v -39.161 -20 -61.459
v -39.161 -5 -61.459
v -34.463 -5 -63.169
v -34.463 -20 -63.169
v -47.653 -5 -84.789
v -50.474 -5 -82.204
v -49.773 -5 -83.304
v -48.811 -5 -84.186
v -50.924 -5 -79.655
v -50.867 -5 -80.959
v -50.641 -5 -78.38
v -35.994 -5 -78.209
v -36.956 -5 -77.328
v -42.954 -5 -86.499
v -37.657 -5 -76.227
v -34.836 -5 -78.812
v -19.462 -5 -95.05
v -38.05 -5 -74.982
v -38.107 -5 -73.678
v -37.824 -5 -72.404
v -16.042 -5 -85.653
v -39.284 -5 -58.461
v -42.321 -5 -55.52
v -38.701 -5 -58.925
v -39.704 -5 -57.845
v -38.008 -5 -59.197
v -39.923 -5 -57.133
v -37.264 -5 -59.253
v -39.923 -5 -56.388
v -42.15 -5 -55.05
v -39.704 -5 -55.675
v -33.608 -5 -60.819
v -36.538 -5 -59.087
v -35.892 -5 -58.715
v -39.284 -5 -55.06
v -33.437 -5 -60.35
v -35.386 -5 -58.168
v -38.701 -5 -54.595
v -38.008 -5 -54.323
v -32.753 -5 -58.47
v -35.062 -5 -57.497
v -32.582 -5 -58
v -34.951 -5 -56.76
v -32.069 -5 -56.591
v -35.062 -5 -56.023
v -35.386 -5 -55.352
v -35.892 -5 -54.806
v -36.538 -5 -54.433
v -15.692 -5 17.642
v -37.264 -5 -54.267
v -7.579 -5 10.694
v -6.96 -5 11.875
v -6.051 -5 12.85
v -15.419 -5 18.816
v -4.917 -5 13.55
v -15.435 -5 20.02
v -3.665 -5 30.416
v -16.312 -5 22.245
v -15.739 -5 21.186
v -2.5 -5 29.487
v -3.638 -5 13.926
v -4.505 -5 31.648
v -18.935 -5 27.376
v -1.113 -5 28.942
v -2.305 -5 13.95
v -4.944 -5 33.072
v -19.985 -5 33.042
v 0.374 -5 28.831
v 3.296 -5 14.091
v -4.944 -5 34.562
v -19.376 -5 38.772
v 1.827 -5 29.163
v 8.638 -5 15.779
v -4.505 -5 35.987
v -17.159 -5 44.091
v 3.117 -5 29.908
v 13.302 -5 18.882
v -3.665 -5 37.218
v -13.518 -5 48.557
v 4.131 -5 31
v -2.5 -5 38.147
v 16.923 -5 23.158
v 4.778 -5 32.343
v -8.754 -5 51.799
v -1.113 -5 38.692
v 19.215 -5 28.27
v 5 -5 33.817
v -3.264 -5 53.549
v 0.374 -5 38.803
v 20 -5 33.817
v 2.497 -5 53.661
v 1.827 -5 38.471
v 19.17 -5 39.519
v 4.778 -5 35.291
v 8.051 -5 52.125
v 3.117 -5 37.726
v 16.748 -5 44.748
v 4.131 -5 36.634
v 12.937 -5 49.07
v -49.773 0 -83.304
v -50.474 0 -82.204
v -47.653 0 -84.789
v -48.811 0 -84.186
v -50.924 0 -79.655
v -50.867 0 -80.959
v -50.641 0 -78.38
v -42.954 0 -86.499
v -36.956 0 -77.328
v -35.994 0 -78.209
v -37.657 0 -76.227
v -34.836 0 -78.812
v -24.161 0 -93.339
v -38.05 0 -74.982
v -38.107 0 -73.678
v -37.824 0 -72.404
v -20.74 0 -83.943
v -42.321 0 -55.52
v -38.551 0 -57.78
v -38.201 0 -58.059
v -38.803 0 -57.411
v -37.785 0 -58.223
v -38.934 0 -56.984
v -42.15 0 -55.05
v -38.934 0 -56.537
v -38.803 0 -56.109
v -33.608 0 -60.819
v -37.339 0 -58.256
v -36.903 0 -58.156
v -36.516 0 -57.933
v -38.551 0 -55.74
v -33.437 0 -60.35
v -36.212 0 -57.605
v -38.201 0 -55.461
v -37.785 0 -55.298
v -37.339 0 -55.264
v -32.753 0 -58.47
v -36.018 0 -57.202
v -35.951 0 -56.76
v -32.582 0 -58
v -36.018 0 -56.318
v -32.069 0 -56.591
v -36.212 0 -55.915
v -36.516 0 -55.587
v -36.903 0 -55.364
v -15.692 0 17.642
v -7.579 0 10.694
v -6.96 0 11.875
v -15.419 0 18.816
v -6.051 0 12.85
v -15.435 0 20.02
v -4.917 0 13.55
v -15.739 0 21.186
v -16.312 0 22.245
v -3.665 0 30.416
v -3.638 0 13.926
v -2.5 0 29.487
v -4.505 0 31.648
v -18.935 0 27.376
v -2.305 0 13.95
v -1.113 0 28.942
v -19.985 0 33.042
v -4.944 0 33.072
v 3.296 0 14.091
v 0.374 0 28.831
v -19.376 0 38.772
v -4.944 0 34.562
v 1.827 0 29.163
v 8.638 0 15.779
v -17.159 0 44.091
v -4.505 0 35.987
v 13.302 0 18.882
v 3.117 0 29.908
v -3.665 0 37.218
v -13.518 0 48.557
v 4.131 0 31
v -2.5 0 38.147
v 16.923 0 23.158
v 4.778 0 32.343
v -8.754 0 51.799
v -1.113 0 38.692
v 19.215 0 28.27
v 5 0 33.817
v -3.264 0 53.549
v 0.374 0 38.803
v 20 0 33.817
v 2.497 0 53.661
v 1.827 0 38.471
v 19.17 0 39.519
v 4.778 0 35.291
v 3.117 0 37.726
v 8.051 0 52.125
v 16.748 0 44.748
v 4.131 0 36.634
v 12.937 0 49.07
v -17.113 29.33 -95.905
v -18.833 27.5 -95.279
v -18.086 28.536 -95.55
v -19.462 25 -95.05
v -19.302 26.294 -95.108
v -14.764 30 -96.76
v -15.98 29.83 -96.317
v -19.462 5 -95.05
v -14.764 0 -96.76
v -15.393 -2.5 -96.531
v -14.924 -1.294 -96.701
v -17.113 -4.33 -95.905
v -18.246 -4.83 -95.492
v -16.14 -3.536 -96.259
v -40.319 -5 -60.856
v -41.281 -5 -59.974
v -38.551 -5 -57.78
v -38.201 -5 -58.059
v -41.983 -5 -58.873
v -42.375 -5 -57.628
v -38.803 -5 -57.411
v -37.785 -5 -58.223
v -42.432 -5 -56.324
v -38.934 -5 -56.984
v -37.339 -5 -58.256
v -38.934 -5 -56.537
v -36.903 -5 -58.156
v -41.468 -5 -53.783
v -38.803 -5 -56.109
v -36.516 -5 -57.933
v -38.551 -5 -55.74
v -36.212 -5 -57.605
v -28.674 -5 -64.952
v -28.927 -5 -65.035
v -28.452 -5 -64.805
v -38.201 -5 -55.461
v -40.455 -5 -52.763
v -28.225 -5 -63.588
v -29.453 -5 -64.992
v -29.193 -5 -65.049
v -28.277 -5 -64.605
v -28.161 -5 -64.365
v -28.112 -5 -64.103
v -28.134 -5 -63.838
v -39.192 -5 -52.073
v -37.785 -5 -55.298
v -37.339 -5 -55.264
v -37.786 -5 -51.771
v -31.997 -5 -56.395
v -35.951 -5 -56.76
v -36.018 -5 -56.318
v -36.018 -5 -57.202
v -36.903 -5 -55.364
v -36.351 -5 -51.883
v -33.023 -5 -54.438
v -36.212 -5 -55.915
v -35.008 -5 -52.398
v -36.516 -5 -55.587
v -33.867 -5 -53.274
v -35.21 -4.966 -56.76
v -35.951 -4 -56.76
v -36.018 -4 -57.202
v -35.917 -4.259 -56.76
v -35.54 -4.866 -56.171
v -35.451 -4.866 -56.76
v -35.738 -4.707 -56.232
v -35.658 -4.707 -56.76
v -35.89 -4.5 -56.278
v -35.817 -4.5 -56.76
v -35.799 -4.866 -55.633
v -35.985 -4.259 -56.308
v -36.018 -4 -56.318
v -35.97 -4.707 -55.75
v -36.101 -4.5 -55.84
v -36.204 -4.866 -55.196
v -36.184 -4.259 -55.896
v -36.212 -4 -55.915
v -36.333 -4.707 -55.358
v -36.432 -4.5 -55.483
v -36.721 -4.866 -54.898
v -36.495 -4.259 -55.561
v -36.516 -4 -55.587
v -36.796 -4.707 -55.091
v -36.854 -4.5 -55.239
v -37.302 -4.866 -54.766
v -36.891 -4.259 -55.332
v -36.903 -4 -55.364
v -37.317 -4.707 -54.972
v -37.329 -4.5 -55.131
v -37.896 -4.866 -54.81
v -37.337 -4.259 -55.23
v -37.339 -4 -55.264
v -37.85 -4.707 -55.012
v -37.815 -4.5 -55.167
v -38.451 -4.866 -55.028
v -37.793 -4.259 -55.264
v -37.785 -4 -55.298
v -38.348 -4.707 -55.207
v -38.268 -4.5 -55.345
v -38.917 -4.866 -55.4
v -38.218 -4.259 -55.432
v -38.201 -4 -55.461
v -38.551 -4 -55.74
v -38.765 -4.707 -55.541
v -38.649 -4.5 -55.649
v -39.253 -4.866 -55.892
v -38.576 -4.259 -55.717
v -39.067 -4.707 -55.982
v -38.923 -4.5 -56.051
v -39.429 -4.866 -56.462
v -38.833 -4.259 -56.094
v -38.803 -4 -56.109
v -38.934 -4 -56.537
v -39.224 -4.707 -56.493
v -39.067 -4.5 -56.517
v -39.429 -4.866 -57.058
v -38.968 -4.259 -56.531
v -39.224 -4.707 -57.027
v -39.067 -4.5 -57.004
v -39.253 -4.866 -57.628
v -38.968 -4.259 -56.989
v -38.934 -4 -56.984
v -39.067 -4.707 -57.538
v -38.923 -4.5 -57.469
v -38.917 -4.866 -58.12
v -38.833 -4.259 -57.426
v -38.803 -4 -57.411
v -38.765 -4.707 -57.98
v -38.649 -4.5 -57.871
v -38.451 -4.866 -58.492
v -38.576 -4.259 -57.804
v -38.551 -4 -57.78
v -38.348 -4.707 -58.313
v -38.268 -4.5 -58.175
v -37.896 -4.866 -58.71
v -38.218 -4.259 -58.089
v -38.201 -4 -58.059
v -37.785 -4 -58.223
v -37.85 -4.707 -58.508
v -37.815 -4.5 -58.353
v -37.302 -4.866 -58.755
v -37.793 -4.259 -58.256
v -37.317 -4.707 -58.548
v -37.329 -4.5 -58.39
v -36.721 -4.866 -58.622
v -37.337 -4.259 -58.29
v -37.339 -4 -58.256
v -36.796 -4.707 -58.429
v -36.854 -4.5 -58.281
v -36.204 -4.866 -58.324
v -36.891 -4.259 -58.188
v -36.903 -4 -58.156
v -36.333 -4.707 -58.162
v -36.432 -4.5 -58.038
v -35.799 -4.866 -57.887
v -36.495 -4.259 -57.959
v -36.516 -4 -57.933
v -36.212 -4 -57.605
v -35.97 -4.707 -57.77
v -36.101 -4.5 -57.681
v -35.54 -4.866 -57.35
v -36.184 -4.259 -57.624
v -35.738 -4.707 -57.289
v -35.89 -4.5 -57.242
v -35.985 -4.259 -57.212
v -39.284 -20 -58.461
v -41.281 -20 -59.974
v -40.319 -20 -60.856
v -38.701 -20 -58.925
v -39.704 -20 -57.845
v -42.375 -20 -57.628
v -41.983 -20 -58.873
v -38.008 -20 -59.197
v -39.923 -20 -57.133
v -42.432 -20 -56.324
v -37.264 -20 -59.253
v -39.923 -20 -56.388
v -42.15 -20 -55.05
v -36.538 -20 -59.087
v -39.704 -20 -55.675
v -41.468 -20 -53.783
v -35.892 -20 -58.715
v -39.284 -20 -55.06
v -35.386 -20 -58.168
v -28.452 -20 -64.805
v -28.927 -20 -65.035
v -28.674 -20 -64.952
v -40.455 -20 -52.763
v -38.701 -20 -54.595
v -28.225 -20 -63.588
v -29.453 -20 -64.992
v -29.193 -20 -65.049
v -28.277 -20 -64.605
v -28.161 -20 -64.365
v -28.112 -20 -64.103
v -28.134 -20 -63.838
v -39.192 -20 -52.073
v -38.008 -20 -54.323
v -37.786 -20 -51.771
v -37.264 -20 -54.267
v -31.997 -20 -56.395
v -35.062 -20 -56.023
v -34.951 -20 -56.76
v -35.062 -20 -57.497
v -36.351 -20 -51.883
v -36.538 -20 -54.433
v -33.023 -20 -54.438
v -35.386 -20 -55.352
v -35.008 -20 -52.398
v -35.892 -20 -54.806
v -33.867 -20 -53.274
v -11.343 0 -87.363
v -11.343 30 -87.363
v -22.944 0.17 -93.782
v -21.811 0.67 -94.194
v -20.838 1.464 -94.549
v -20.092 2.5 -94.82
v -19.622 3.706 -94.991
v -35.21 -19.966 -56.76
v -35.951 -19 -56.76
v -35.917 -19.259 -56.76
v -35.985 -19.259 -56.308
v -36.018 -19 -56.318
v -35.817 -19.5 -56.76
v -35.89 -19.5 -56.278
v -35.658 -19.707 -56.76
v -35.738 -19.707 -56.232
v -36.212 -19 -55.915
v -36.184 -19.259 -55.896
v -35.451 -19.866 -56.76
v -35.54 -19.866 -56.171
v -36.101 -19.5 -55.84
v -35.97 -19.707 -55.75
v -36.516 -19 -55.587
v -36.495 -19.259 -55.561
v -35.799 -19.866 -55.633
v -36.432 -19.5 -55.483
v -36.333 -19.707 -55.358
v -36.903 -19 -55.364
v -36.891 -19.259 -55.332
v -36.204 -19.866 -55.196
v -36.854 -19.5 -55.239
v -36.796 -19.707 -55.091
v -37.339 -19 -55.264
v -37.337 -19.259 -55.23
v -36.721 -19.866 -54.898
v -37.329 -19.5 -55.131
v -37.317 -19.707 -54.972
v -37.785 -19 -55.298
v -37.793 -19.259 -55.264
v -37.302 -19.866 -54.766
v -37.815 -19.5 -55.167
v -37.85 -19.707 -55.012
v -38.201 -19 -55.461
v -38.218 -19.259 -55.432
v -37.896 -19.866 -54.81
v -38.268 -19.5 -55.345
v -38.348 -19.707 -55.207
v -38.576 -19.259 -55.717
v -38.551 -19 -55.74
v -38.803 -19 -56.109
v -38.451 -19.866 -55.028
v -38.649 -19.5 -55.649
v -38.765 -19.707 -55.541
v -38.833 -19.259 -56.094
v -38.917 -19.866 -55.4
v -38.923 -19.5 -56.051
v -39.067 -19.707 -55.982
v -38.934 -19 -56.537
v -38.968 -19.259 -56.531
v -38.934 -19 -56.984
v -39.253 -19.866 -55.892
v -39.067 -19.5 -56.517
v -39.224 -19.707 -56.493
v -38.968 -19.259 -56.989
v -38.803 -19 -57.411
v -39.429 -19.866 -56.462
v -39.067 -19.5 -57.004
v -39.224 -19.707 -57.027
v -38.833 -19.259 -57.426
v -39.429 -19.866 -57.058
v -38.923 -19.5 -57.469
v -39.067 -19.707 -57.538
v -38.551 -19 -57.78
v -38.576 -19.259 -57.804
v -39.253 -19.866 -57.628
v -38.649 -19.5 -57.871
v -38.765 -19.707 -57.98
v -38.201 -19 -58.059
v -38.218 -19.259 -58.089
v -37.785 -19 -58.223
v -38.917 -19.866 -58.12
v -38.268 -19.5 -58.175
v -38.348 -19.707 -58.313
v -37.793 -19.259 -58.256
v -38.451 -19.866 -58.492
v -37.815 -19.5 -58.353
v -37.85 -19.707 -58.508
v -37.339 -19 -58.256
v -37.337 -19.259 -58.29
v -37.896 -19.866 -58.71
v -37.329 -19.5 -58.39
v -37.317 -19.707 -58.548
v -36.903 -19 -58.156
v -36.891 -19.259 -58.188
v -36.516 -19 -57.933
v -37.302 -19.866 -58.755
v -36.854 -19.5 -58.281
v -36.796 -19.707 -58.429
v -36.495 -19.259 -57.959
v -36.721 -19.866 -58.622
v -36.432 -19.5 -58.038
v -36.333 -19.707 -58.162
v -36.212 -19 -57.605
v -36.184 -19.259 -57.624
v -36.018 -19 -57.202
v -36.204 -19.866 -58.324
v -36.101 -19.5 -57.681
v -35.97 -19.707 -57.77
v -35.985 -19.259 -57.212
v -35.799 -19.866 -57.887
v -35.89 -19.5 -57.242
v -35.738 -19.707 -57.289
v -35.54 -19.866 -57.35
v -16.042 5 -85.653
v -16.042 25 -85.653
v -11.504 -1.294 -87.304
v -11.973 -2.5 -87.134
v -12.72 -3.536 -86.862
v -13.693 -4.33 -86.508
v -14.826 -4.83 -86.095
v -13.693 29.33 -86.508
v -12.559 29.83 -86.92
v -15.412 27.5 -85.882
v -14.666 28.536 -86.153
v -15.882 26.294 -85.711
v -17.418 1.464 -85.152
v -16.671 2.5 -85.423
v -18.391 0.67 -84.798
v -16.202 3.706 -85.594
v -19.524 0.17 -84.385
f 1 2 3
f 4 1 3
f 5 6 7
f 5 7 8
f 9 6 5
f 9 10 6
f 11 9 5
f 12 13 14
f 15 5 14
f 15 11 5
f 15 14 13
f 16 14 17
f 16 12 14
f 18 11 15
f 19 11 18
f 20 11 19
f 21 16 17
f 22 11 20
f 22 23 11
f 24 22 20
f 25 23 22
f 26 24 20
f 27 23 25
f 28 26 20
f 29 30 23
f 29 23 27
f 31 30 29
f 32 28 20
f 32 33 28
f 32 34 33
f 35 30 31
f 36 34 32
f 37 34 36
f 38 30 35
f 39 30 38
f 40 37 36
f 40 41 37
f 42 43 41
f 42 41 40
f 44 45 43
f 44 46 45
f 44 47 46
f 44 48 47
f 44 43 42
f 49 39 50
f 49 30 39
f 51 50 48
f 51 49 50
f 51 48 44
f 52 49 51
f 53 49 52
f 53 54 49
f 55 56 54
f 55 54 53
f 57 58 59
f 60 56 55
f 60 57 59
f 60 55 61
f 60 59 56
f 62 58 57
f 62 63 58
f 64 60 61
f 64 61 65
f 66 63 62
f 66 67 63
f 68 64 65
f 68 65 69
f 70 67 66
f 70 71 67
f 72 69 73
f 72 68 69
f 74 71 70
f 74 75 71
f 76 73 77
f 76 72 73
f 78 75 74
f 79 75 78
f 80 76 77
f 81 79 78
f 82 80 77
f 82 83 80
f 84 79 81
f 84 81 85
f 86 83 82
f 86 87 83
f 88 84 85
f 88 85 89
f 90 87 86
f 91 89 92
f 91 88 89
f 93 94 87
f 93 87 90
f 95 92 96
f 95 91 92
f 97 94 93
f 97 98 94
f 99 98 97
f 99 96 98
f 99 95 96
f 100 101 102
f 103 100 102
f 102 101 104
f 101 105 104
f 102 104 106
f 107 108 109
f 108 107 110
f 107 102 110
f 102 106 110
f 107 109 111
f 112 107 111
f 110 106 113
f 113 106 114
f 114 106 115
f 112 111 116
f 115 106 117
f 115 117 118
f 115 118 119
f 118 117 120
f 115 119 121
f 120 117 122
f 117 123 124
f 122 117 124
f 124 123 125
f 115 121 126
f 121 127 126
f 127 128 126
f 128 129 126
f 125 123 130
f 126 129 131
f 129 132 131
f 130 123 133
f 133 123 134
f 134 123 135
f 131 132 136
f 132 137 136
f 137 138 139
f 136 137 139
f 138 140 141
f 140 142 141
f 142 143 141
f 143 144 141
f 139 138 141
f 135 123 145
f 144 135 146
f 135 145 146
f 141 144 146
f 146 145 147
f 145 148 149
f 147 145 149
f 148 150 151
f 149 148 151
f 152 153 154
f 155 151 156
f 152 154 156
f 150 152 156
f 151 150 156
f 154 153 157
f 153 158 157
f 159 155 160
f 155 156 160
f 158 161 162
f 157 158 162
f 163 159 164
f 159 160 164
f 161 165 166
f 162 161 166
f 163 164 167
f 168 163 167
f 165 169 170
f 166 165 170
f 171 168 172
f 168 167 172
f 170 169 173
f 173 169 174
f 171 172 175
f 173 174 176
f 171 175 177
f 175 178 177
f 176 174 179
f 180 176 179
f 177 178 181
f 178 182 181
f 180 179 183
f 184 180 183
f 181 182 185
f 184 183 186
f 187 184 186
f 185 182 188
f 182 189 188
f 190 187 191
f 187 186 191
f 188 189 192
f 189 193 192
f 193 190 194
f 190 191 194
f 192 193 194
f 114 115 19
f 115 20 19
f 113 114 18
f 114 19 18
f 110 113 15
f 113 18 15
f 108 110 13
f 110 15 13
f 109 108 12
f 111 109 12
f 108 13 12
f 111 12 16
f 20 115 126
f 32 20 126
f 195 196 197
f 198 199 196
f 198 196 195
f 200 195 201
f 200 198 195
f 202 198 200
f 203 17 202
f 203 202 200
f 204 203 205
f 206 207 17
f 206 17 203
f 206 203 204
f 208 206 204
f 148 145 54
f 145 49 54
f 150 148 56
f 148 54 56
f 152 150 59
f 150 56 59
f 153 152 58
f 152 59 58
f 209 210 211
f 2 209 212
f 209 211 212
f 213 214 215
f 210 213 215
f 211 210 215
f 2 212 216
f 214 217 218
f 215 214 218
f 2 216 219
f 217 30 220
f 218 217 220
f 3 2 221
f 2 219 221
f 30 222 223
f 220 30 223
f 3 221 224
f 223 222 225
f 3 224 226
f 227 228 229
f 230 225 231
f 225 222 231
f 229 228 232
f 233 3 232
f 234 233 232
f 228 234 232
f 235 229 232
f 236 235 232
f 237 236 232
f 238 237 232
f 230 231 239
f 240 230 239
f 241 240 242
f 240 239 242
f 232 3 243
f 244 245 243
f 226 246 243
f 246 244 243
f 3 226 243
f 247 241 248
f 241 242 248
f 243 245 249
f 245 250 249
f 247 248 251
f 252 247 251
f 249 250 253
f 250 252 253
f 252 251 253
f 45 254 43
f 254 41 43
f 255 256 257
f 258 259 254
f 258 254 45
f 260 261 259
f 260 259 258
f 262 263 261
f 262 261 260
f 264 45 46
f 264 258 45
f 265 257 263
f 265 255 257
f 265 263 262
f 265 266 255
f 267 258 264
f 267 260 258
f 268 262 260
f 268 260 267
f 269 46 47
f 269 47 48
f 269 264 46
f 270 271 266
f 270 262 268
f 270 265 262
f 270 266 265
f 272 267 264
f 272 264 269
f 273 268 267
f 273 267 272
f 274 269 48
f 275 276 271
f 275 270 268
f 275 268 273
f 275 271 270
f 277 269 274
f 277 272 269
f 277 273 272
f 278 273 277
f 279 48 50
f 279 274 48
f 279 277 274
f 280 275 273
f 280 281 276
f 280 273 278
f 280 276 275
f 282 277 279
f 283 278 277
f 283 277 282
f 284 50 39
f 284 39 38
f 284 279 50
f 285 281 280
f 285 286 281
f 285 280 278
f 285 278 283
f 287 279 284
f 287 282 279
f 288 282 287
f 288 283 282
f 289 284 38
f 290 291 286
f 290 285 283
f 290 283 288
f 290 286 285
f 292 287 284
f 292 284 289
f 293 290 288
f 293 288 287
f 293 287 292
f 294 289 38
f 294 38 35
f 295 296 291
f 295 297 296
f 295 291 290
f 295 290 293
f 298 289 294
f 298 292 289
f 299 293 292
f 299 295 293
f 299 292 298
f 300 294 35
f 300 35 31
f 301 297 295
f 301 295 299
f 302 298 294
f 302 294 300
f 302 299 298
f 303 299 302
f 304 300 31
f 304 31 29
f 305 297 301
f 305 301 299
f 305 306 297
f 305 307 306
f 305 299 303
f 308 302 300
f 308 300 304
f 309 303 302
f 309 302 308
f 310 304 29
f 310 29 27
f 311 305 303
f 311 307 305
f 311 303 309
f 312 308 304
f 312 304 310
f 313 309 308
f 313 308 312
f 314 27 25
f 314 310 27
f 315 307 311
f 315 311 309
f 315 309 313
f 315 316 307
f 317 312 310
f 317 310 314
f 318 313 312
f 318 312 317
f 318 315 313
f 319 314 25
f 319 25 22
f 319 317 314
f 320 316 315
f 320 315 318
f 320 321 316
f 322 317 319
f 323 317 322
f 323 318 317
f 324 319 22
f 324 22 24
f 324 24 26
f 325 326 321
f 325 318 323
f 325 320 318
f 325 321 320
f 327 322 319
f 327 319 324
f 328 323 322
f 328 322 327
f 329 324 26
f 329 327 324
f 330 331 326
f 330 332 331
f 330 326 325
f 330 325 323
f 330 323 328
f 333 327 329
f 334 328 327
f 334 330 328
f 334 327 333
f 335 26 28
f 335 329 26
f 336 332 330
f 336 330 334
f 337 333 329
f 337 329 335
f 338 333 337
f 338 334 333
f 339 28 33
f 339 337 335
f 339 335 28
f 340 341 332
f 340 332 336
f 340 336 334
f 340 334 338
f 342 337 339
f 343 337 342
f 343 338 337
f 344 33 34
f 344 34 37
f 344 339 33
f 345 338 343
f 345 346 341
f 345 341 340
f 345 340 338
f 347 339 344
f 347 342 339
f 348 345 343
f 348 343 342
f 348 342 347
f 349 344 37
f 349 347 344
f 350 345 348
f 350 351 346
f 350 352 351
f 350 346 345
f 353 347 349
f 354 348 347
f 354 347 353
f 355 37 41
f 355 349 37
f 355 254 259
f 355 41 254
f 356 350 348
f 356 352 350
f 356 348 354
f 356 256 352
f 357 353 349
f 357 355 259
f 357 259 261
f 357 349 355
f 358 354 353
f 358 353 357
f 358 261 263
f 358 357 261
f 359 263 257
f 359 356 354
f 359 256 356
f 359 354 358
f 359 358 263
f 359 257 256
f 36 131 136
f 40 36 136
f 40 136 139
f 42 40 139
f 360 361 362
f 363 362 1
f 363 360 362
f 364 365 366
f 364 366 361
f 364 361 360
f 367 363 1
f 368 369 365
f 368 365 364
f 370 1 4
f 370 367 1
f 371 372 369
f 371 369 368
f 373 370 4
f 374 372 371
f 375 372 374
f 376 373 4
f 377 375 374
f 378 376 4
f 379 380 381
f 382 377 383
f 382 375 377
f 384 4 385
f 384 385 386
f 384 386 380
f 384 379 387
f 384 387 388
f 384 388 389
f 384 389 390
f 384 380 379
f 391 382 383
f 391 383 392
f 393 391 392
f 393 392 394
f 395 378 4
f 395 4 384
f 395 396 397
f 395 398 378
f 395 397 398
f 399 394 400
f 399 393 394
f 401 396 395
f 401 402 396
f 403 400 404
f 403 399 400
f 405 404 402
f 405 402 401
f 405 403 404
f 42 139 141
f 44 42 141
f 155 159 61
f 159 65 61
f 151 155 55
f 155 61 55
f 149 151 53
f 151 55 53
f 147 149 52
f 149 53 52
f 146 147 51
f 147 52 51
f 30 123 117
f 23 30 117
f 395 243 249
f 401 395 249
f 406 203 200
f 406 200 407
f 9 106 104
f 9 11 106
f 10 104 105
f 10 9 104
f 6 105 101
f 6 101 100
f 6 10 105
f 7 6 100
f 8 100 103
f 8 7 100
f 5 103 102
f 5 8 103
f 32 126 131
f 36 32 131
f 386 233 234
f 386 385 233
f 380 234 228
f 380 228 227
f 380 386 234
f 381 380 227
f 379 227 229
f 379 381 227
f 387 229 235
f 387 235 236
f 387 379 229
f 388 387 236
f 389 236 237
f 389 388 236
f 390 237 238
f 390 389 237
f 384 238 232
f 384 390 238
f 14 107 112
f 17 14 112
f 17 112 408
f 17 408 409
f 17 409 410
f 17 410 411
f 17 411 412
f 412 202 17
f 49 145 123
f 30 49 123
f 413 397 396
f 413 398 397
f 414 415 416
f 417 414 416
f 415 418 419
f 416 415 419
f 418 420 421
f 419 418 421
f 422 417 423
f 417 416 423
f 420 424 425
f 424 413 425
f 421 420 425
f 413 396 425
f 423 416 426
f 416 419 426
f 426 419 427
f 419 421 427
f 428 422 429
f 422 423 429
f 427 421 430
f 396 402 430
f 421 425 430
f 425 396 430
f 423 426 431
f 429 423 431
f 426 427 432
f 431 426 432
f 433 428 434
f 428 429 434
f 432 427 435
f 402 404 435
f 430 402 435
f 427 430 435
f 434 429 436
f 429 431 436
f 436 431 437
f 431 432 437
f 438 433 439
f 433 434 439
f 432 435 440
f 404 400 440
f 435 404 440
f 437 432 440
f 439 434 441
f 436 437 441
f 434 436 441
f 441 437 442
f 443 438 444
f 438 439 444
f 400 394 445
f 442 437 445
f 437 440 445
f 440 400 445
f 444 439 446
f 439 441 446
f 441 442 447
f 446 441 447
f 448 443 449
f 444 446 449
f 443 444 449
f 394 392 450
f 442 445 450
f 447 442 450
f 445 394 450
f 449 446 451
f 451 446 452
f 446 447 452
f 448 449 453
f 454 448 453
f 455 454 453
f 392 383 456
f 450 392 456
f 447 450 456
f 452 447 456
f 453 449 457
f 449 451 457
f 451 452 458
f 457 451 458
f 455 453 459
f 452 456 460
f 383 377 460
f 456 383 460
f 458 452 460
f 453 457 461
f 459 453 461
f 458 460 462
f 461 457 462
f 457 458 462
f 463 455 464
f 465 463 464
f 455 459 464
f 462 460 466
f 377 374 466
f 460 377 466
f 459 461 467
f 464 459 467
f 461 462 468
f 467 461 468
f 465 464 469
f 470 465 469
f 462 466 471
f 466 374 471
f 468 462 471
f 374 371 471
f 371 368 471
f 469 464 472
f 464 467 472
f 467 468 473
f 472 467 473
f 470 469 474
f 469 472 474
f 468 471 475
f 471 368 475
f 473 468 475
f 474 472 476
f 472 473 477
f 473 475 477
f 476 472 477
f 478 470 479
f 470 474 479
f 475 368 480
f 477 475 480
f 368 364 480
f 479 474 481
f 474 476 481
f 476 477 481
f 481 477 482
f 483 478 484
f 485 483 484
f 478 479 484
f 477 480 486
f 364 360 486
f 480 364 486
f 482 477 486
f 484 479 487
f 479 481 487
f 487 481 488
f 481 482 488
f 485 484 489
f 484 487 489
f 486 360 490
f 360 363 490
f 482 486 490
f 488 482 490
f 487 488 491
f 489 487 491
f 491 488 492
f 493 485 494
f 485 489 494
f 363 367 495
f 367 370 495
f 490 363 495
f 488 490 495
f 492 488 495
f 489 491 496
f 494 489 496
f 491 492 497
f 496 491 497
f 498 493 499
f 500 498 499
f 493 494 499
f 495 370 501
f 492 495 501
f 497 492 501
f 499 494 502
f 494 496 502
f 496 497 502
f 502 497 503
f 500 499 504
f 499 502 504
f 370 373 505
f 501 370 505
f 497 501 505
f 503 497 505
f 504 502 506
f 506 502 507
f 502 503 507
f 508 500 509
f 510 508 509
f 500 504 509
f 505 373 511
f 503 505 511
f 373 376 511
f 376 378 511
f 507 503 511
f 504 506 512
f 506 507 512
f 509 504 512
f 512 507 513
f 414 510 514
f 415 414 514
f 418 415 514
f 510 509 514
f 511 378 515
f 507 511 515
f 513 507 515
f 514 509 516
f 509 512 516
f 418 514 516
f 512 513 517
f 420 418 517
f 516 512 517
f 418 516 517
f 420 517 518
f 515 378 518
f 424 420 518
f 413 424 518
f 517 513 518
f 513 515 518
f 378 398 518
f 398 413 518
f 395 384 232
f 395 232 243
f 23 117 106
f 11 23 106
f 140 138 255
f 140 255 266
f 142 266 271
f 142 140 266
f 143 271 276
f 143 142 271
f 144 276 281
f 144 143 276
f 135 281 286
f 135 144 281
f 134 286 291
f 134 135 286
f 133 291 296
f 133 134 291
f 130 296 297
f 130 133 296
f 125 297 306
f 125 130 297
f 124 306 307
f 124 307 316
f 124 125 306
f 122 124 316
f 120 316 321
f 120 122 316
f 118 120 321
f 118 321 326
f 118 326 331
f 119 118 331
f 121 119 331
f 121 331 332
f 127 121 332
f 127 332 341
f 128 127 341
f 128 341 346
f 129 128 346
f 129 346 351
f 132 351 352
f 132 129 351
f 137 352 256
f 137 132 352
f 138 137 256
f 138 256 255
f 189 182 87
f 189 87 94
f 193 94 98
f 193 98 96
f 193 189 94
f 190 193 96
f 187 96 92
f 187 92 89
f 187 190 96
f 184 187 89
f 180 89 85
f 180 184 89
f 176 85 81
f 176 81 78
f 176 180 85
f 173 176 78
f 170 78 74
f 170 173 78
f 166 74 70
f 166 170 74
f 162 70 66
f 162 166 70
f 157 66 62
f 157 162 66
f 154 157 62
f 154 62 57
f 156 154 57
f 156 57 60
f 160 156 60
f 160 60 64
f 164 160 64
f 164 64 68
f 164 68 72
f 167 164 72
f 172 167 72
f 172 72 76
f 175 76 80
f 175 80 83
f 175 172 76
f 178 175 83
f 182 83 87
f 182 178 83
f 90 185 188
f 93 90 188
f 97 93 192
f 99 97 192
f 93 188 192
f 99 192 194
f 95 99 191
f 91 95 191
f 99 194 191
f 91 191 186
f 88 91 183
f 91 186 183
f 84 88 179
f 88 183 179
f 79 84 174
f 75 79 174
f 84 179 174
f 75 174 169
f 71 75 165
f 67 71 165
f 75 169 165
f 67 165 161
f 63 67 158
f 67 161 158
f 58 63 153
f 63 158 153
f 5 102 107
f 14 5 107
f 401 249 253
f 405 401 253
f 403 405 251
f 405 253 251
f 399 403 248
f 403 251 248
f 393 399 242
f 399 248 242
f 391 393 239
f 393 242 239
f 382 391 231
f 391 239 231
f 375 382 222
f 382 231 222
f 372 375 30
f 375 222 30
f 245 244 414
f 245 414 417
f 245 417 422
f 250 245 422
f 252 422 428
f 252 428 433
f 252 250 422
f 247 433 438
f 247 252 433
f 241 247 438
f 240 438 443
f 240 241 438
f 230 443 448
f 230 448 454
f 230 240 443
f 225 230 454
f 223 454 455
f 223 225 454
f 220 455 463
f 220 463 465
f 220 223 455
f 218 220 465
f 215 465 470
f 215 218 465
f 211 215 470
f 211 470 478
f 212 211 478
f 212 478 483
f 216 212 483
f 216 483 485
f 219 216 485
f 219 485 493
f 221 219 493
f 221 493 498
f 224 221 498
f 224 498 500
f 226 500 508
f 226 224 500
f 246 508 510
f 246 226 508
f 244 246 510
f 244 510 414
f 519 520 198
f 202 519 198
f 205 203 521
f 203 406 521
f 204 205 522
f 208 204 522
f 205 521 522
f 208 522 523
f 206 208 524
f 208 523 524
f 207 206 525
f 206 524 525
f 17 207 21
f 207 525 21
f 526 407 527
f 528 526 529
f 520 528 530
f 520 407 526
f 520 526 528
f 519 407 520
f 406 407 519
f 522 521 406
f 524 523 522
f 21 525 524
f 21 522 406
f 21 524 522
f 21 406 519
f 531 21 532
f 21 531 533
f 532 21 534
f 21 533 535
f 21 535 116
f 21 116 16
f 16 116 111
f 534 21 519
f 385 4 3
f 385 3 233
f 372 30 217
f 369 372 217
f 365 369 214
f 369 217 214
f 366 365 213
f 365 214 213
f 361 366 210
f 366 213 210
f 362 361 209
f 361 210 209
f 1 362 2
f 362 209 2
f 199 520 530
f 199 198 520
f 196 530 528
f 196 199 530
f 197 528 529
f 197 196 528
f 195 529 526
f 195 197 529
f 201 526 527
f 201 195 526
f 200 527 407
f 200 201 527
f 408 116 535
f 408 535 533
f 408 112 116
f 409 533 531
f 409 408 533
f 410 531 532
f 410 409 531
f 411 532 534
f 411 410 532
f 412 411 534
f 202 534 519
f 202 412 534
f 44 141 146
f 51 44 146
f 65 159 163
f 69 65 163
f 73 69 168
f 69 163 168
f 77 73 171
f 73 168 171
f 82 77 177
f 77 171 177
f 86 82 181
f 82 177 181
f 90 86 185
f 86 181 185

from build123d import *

# Parameters (mm, degrees)
F0_R     = 5
F0_R_2   = 1.5
F1_DEPTH = 5
F2_DEPTH = 30
F4_R     = 4.99999
F5_R     = 5
F3_R     = 1.5
F6_DEPTH = 15
F7_R     = 1
F7_2_R   = 1


# Not quite as in the source:
# - a fillet or chamfer is up to 0.001 mm smaller than in the source, because OpenCascade refuses the exact size
# - a feature names something its author has since deleted; it is built from what else it names


with BuildPart() as f1:
    # F0 (on Front) → F1 (new body)
    with BuildSketch(Plane.XZ):
        with BuildLine():
            ThreePointArc((20, 33.8170940264), (-7.2600924867, 52.4528407806), (-14.7291057085, 20.287369527))
            ThreePointArc((-14.7291057085, 20.287369527), (-10.7719287617, 16.9658166044), (-6.0959419995, 14.7687478741))
            ThreePointArc((-6.0959419995, 14.7687478741), (11.7915469725, 17.6628555734), (20, 33.8170940264))
        make_face()
        with Locations((0, 33.8170940264)):
            Circle(F0_R, mode=Mode.SUBTRACT)
        with BuildLine():
            Line((-14.7291057085, 20.287369527), (-42.1496687283, -55.0500081989))
            ThreePointArc((-42.1496687283, -55.0500081989), (-36.7371185286, -51.8113638601), (-32.4609528428, -56.4480570615))
            Line((-32.4609528428, -56.4480570615), (-32.0687023036, -56.5908245822))
            Line((-32.0687023036, -56.5908245822), (-6.0959419995, 14.7687478741))
            ThreePointArc((-6.0959419995, 14.7687478741), (-10.7719287617, 16.9658166044), (-14.7291057085, 20.287369527))
        make_face()
        with BuildLine():
            ThreePointArc((-32.4512056942, -56.7601091071), (-32.5271669199, -57.628349943), (-32.7527425538, -58.4702097236))
            Line((-32.7527425538, -58.4702097236), (-32.5817325186, -58.0003635134))
            Line((-32.5817325186, -58.0003635134), (-32.0687023036, -56.5908245822))
            Line((-32.0687023036, -56.5908245822), (-32.4609528428, -56.4480570615))
            ThreePointArc((-32.4609528428, -56.4480570615), (-32.4536430754, -56.6040069883), (-32.4512056942, -56.7601091071))
        make_face()
        with BuildLine():
            ThreePointArc((-33.8290334161, -60.2068275447), (-33.2012405407, -59.3940787717), (-32.7527425538, -58.4702097236))
            ThreePointArc((-32.7527425538, -58.4702097236), (-32.5271669199, -57.628349943), (-32.4512056942, -56.7601091071))
            ThreePointArc((-32.4512056942, -56.7601091071), (-32.4536430754, -56.6040069883), (-32.4609528428, -56.4480570615))
            ThreePointArc((-32.4609528428, -56.4480570615), (-36.7371185286, -51.8113638601), (-42.1496687283, -55.0500081989))
            ThreePointArc((-42.1496687283, -55.0500081989), (-40.0851754907, -61.0100741788), (-33.8290334161, -60.2068275447))
        make_face()
        with Locations((-37.4512056942, -56.7601091071)):
            Circle(F0_R_2, mode=Mode.SUBTRACT)
        with BuildLine():
            Line((-39.5341938332, -77.1020939848), (-33.6077929485, -60.8194413757))
            Line((-33.6077929485, -60.8194413757), (-33.4367828769, -60.3495950653))
            Line((-33.4367828769, -60.3495950653), (-33.8290334161, -60.2068275447))
            ThreePointArc((-33.8290334161, -60.2068275447), (-40.0851754907, -61.0100741788), (-42.1496687283, -55.0500081989))
            Line((-42.1496687283, -55.0500081989), (-42.3206788698, -55.5198547009))
            Line((-42.3206788698, -55.5198547009), (-52.3513214743, -83.0788187594))
            Line((-52.3513214743, -83.0788187594), (-42.9543952664, -86.4990201927))
            Line((-42.9543952664, -86.4990201927), (-39.5341938332, -77.1020939848))
        make_face()
        with BuildLine():
            Line((-33.8290334161, -60.2068275447), (-33.4367828769, -60.3495950653))
            Line((-33.4367828769, -60.3495950653), (-32.7527425538, -58.4702097236))
            ThreePointArc((-32.7527425538, -58.4702097236), (-33.2012405407, -59.3940787717), (-33.8290334161, -60.2068275447))
        make_face()
        Polygon((-16.0418783135, -85.652597568), (-39.5341938332, -77.1020939848), (-42.9543952664, -86.4990201927), (-19.4620797468, -95.0495237758), align=None)
        Polygon((-11.3434152096, -87.3626982846), (-16.0418783135, -85.652597568), (-19.4620797468, -95.0495237758), (-14.7636166428, -96.7596244924), align=None)
    extrude(amount=F1_DEPTH)

    # F0 (on Front) → F2 (join)
    with BuildSketch(Plane.XZ):
        Polygon((-11.3434152096, -87.3626982846), (-16.0418783135, -85.652597568), (-19.4620797468, -95.0495237758), (-14.7636166428, -96.7596244924), align=None)
    extrude(amount=-F2_DEPTH)

    # F4 (radius 5 in the source; OpenCascade refuses exactly that, so slightly less here)
    f4_edges = [f1.edges().sort_by_distance(p)[0] for p in [
        (-52.351321, -2.5, -83.078819),
        (-13.053516, -5, -92.061161),
        (-17.751979, 30, -90.351061),
        (-17.751979, 0, -90.351061),
        (-39.534194, -2.5, -77.102094),
    ]]
    fillet(f4_edges, radius=F4_R)

    # F5
    f5_edges = [f1.edges().sort_by_distance(p)[0] for p in [
        (-6.095942, -2.5, 14.768748),
        (-14.729106, -2.5, 20.28737),
    ]]
    fillet(f5_edges, radius=F5_R)

    # F7
    f7_edges = [f1.edges().sort_by_distance(p)[0] for p in [
        (-38.951206, -5, -56.760109),
    ]]
    fillet(f7_edges, radius=F7_R)


with BuildPart() as f6:
    # F3 (on face) → F6 (new body)
    with BuildSketch(Plane.XZ.offset(5)):
        with BuildLine():
            ThreePointArc((-32.7527426235, -58.470209915), (-32.5271669375, -57.6283500433), (-32.4512056942, -56.7601091071))
            ThreePointArc((-32.4512056942, -56.7601091071), (-32.5962642376, -55.5644739399), (-33.0230230754, -54.438213611))
            ThreePointArc((-33.0230230754, -54.438213611), (-37.7856244233, -51.7713052311), (-42.149668581, -55.050007794))
            ThreePointArc((-42.149668581, -55.050007794), (-41.9827447635, -58.8732001282), (-39.1613064108, -61.458572211))
            ThreePointArc((-39.1613064108, -61.458572211), (-35.3381144295, -61.2916480628), (-32.7527426235, -58.470209915))
        make_face()
        with Locations((-37.4512056942, -56.7601091071)):
            Circle(F3_R, mode=Mode.SUBTRACT)
        with BuildLine():
            ThreePointArc((-33.0230230754, -54.438213611), (-32.5962642376, -55.5644739399), (-32.4512056942, -56.7601091071))
            ThreePointArc((-32.4512056942, -56.7601091071), (-32.5271669375, -57.6283500433), (-32.7527426235, -58.470209915))
            Line((-32.7527426235, -58.470209915), (-31.9972492992, -56.3945090662))
            Line((-31.9972492992, -56.3945090662), (-33.0230230754, -54.438213611))
        make_face()
        with BuildLine():
            Line((-34.4628433069, -63.1686729277), (-32.7527426235, -58.470209915))
            ThreePointArc((-32.7527426235, -58.470209915), (-35.3381144295, -61.2916480628), (-39.1613064108, -61.458572211))
            Line((-39.1613064108, -61.458572211), (-34.4628433069, -63.1686729277))
        make_face()
        Polygon((-31.9972492992, -56.3945090662), (-32.7527426235, -58.470209915), (-34.4628433069, -63.1686729277), (-27.0259488145, -65.8754811583), align=None)
    extrude(amount=F6_DEPTH)

    # F7#2
    f7_2_edges = [f6.edges().sort_by_distance(p)[0] for p in [
        (-27.025949, -12.5, -65.875481),
        (-38.951206, -20, -56.760109),
    ]]
    fillet(f7_2_edges, radius=F7_2_R)


solid = Compound([f1.part, f6.part])
